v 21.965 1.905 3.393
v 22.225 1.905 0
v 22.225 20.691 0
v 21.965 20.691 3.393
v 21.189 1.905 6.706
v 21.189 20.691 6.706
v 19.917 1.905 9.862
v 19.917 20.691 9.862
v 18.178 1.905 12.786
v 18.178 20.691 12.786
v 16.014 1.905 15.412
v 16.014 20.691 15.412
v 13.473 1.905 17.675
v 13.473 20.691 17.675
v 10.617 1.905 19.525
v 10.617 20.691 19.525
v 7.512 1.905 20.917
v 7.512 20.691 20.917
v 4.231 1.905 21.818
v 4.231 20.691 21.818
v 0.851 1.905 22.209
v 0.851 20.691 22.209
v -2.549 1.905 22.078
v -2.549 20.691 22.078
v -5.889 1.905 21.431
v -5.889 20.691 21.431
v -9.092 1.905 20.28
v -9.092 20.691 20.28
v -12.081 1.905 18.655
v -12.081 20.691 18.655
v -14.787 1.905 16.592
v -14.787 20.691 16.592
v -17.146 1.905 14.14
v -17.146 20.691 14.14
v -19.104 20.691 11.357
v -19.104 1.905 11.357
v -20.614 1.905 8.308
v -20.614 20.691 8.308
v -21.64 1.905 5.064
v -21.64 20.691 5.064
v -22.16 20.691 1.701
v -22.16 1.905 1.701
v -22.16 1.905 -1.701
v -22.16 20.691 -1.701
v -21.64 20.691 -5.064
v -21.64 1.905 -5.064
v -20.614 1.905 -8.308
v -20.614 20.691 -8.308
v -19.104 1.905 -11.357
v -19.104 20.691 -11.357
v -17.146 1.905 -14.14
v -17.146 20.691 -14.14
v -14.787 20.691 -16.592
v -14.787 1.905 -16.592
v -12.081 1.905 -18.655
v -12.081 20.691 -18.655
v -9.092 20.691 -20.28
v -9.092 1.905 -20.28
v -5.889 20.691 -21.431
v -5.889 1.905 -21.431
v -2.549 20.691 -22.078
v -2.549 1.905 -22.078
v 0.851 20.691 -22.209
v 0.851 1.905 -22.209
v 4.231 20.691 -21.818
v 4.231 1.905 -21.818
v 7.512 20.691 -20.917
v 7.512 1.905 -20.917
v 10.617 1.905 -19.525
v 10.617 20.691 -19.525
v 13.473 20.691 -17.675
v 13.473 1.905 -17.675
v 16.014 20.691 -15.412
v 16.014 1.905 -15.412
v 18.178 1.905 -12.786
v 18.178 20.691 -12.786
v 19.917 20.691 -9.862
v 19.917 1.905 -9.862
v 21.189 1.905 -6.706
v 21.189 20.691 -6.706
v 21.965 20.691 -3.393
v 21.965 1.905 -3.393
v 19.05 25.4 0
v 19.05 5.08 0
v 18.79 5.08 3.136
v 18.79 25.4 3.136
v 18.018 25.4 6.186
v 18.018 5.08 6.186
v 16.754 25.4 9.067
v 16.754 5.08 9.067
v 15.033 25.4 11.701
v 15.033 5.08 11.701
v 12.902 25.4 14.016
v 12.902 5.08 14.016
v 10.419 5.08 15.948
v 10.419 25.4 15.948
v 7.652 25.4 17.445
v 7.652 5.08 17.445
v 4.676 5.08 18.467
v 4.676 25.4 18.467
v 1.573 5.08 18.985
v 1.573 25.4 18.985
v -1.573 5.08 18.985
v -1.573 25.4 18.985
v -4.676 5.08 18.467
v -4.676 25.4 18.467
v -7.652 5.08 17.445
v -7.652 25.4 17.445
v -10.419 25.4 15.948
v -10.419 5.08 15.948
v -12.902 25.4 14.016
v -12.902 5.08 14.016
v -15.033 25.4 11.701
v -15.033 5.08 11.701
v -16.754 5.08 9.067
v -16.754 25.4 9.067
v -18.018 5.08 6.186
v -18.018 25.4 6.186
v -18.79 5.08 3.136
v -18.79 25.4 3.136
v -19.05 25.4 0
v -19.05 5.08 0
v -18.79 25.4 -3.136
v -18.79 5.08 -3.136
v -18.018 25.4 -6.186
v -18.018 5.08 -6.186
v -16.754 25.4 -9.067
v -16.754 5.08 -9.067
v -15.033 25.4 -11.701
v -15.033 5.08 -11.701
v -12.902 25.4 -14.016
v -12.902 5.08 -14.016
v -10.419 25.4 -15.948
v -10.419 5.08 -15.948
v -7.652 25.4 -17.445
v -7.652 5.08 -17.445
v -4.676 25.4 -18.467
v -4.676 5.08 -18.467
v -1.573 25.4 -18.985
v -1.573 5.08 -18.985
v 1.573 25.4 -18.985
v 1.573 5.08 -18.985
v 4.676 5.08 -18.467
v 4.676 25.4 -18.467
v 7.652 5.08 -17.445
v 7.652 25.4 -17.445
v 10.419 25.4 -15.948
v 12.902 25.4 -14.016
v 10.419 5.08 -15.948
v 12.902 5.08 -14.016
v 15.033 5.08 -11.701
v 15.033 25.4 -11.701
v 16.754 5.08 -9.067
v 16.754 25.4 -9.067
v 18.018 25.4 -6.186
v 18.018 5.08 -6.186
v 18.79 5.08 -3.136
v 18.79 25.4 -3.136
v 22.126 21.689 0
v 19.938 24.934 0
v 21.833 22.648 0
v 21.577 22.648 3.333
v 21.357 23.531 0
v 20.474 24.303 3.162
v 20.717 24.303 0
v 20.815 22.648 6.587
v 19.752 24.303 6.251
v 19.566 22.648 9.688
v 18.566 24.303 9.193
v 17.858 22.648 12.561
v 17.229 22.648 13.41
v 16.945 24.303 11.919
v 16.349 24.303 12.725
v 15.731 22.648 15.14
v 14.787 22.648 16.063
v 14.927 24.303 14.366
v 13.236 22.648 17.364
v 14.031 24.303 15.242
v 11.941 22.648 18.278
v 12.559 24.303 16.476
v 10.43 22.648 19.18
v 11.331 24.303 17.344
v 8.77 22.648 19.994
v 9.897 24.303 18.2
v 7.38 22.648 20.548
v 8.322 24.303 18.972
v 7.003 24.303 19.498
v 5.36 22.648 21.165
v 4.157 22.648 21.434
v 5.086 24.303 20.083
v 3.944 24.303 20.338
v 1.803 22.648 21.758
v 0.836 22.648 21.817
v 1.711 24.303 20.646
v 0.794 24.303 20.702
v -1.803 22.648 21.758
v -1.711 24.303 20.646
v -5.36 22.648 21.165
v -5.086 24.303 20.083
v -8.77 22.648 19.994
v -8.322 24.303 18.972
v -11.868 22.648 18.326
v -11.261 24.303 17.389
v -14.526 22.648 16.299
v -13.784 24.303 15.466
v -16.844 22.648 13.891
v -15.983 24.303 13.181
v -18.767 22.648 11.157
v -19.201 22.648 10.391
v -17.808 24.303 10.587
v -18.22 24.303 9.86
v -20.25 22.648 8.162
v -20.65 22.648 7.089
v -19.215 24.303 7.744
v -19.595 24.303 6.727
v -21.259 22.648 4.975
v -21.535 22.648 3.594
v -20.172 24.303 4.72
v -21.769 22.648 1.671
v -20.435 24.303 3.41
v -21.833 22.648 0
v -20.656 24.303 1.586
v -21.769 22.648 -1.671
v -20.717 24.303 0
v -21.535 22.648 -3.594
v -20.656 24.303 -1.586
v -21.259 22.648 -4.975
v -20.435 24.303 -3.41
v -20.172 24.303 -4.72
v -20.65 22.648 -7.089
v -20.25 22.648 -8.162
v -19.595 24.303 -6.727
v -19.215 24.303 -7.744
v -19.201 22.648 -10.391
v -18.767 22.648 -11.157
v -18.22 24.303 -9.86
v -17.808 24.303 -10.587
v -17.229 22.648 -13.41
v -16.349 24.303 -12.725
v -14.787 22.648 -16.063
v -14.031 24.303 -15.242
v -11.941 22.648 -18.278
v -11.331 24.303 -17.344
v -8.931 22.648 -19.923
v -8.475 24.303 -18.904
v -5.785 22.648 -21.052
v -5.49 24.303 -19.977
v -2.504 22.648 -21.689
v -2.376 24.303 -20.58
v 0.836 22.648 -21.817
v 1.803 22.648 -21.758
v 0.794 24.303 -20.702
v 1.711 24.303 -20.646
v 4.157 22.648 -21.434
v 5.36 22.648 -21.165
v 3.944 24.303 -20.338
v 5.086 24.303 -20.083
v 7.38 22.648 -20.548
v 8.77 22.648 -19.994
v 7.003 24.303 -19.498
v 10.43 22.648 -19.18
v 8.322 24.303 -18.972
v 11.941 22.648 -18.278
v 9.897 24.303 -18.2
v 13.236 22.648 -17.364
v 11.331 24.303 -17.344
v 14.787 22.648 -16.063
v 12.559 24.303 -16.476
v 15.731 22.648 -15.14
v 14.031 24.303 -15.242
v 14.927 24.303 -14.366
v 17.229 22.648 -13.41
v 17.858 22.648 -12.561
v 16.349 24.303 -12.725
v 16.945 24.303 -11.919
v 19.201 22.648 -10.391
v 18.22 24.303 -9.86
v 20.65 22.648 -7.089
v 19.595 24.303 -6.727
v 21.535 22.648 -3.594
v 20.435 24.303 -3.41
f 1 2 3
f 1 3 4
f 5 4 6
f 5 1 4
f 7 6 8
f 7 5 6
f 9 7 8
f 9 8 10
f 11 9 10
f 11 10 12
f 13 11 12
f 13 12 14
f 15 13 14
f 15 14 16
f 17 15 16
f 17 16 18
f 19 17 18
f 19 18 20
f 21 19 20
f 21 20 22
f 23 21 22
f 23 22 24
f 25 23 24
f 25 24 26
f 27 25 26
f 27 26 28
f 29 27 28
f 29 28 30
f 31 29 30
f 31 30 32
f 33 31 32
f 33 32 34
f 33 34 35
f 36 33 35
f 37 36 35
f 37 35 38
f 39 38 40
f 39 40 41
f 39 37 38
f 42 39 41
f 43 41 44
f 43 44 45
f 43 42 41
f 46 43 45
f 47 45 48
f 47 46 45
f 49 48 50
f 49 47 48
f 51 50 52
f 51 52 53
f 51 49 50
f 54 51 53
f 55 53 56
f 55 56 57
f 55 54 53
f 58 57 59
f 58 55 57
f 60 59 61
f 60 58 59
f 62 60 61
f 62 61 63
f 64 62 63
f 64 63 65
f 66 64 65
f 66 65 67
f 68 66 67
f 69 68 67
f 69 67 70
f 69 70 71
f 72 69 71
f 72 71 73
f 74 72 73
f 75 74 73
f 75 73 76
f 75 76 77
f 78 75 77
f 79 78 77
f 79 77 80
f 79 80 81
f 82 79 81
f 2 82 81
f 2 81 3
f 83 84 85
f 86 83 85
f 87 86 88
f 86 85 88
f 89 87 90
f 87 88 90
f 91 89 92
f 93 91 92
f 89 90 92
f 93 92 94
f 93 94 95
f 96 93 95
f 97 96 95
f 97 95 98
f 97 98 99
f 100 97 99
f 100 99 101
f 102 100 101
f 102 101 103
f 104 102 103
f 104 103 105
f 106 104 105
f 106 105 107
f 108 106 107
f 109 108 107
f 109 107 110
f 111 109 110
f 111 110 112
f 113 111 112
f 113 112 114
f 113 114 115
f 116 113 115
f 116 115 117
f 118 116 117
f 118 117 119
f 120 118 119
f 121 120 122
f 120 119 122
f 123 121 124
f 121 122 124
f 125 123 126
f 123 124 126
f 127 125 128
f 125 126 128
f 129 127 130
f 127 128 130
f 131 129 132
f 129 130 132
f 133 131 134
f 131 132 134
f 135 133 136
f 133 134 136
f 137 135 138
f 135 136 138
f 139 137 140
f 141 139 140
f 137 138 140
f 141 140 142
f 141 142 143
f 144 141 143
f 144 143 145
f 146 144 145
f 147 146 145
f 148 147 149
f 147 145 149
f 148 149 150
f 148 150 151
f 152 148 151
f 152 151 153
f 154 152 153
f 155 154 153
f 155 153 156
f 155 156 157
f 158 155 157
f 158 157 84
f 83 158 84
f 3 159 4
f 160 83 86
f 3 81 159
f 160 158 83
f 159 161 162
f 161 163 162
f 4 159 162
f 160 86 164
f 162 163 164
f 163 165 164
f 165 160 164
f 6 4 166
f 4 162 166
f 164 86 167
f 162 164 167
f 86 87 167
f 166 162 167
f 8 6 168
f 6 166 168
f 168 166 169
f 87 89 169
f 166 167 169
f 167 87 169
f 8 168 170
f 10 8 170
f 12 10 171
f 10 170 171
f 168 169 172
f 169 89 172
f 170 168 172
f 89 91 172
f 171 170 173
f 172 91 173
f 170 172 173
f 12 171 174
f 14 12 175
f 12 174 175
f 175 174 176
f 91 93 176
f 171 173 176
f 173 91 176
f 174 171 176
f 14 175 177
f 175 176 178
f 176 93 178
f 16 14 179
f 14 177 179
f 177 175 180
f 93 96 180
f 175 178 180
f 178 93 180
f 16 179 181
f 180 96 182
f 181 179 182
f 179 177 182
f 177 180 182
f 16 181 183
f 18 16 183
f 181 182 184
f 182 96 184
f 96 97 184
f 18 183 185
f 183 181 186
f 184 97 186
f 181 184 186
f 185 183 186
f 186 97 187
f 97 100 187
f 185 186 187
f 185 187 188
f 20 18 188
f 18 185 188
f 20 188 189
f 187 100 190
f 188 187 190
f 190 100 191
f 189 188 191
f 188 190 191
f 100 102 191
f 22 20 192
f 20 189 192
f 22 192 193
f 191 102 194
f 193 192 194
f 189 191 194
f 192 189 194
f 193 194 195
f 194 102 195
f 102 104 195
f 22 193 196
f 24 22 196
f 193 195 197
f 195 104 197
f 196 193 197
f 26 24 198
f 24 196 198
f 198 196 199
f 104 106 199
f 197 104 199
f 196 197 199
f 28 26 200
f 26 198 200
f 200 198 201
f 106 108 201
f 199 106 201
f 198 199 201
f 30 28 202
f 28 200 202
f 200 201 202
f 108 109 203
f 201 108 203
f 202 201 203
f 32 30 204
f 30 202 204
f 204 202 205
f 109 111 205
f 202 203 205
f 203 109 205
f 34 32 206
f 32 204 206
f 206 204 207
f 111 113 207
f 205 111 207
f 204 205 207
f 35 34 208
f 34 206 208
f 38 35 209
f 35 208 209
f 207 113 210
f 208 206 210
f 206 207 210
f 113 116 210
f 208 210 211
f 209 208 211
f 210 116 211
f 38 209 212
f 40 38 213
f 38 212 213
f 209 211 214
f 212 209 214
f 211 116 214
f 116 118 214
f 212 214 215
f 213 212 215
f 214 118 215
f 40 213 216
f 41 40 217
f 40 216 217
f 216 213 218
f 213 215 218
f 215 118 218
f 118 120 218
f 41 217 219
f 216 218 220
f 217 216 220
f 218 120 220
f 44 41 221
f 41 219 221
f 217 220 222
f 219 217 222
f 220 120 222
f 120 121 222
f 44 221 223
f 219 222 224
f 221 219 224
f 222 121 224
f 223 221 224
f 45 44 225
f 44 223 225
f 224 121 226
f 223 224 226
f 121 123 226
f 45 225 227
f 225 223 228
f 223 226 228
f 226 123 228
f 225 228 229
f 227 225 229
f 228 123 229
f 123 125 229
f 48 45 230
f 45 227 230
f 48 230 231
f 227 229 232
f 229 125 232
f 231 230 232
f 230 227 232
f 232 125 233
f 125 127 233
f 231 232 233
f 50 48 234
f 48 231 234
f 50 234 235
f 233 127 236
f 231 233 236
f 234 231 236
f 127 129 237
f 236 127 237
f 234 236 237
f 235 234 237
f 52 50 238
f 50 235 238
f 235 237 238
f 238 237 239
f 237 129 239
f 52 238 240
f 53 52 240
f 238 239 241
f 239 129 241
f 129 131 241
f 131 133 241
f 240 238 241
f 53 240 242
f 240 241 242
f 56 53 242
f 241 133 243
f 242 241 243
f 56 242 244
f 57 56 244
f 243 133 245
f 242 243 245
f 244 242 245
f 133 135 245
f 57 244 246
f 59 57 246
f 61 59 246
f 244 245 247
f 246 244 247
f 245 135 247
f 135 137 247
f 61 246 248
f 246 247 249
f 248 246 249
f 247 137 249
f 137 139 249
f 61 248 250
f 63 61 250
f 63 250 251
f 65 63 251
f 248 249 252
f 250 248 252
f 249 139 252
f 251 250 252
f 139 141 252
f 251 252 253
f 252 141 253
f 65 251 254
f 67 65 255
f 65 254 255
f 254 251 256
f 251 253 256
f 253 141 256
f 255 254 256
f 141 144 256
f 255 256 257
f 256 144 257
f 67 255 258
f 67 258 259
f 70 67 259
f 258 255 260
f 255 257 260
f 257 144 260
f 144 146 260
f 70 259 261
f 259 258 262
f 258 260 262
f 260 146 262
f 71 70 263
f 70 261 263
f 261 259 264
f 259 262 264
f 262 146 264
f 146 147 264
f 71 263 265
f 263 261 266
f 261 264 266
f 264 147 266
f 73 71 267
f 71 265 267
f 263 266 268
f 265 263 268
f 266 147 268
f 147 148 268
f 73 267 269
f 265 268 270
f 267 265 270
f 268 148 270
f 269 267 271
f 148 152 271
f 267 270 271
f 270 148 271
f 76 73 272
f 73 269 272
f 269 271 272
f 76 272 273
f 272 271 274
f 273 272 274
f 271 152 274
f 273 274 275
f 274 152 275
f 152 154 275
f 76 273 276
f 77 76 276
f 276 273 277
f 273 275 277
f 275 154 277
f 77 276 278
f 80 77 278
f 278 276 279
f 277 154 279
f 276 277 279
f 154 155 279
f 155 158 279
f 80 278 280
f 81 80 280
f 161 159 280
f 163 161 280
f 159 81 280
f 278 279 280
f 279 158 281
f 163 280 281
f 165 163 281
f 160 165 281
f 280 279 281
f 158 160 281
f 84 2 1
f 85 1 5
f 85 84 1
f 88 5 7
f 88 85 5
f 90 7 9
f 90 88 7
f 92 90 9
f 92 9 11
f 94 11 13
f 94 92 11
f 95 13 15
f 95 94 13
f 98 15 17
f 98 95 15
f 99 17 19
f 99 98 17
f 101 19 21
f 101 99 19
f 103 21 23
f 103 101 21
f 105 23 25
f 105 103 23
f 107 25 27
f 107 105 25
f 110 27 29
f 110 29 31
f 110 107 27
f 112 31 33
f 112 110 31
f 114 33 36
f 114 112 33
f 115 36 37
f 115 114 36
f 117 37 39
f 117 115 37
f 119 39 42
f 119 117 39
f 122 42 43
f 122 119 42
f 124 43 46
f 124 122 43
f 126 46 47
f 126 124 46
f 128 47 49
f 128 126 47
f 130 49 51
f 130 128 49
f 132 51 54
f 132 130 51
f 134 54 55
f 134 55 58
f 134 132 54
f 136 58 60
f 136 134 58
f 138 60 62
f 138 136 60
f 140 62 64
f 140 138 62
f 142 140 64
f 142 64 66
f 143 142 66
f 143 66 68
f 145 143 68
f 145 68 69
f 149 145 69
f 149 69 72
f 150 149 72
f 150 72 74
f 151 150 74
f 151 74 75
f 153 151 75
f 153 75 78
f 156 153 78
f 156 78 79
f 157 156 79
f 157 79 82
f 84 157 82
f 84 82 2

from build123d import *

# Parameters (mm, degrees)
F0_R     = 22.225
F1_DEPTH = 25.4
F2_T     = -3.175


# Not quite as in the source:
# - a fillet or chamfer that OpenCascade refuses, or shapes differently, is made with other operations: its cross-section is extruded or revolved along the edge and cut away or added


with BuildPart() as f1:
    # F0 (on Front) → F1 (new body)
    with BuildSketch(Plane.XZ):
        Circle(F0_R)
    extrude(amount=-F1_DEPTH)

    # F2
    f2_openings = [f1.faces().sort_by_distance(p)[0] for p in [
        (0, 0, 0),
        (0, 25.4, 0),
    ]]
    offset(amount=F2_T, openings=f2_openings)

    # F3: chamfer of 5.08 on 1 edges, made by hand

    # F3_s1 → F3_t2 (revolve, cut)
    with BuildSketch(Plane.XY):
        Polygon((24.13, 0), (19.05, 5.08), (19.05, 0), align=None)
    revolve(axis=Axis((0, 0, 0), (0, -1, 0)), mode=Mode.SUBTRACT)

    # F4: fillet of radius 5.08 on 1 edges, made by hand

    # F4_s1 → F4_t2 (revolve, cut)
    with BuildSketch(Plane.XY):
        with BuildLine():
            ThreePointArc((22.225, 20.6907139607), (21.3571134838, 23.5305202921), (19.05, 25.4))
            Line((19.05, 25.4), (22.225, 25.4))
            Line((22.225, 25.4), (22.225, 20.6907139607))
        make_face()
    revolve(axis=Axis((0, 25.4, 0), (0, -1, 0)), mode=Mode.SUBTRACT)


solid = f1.part
